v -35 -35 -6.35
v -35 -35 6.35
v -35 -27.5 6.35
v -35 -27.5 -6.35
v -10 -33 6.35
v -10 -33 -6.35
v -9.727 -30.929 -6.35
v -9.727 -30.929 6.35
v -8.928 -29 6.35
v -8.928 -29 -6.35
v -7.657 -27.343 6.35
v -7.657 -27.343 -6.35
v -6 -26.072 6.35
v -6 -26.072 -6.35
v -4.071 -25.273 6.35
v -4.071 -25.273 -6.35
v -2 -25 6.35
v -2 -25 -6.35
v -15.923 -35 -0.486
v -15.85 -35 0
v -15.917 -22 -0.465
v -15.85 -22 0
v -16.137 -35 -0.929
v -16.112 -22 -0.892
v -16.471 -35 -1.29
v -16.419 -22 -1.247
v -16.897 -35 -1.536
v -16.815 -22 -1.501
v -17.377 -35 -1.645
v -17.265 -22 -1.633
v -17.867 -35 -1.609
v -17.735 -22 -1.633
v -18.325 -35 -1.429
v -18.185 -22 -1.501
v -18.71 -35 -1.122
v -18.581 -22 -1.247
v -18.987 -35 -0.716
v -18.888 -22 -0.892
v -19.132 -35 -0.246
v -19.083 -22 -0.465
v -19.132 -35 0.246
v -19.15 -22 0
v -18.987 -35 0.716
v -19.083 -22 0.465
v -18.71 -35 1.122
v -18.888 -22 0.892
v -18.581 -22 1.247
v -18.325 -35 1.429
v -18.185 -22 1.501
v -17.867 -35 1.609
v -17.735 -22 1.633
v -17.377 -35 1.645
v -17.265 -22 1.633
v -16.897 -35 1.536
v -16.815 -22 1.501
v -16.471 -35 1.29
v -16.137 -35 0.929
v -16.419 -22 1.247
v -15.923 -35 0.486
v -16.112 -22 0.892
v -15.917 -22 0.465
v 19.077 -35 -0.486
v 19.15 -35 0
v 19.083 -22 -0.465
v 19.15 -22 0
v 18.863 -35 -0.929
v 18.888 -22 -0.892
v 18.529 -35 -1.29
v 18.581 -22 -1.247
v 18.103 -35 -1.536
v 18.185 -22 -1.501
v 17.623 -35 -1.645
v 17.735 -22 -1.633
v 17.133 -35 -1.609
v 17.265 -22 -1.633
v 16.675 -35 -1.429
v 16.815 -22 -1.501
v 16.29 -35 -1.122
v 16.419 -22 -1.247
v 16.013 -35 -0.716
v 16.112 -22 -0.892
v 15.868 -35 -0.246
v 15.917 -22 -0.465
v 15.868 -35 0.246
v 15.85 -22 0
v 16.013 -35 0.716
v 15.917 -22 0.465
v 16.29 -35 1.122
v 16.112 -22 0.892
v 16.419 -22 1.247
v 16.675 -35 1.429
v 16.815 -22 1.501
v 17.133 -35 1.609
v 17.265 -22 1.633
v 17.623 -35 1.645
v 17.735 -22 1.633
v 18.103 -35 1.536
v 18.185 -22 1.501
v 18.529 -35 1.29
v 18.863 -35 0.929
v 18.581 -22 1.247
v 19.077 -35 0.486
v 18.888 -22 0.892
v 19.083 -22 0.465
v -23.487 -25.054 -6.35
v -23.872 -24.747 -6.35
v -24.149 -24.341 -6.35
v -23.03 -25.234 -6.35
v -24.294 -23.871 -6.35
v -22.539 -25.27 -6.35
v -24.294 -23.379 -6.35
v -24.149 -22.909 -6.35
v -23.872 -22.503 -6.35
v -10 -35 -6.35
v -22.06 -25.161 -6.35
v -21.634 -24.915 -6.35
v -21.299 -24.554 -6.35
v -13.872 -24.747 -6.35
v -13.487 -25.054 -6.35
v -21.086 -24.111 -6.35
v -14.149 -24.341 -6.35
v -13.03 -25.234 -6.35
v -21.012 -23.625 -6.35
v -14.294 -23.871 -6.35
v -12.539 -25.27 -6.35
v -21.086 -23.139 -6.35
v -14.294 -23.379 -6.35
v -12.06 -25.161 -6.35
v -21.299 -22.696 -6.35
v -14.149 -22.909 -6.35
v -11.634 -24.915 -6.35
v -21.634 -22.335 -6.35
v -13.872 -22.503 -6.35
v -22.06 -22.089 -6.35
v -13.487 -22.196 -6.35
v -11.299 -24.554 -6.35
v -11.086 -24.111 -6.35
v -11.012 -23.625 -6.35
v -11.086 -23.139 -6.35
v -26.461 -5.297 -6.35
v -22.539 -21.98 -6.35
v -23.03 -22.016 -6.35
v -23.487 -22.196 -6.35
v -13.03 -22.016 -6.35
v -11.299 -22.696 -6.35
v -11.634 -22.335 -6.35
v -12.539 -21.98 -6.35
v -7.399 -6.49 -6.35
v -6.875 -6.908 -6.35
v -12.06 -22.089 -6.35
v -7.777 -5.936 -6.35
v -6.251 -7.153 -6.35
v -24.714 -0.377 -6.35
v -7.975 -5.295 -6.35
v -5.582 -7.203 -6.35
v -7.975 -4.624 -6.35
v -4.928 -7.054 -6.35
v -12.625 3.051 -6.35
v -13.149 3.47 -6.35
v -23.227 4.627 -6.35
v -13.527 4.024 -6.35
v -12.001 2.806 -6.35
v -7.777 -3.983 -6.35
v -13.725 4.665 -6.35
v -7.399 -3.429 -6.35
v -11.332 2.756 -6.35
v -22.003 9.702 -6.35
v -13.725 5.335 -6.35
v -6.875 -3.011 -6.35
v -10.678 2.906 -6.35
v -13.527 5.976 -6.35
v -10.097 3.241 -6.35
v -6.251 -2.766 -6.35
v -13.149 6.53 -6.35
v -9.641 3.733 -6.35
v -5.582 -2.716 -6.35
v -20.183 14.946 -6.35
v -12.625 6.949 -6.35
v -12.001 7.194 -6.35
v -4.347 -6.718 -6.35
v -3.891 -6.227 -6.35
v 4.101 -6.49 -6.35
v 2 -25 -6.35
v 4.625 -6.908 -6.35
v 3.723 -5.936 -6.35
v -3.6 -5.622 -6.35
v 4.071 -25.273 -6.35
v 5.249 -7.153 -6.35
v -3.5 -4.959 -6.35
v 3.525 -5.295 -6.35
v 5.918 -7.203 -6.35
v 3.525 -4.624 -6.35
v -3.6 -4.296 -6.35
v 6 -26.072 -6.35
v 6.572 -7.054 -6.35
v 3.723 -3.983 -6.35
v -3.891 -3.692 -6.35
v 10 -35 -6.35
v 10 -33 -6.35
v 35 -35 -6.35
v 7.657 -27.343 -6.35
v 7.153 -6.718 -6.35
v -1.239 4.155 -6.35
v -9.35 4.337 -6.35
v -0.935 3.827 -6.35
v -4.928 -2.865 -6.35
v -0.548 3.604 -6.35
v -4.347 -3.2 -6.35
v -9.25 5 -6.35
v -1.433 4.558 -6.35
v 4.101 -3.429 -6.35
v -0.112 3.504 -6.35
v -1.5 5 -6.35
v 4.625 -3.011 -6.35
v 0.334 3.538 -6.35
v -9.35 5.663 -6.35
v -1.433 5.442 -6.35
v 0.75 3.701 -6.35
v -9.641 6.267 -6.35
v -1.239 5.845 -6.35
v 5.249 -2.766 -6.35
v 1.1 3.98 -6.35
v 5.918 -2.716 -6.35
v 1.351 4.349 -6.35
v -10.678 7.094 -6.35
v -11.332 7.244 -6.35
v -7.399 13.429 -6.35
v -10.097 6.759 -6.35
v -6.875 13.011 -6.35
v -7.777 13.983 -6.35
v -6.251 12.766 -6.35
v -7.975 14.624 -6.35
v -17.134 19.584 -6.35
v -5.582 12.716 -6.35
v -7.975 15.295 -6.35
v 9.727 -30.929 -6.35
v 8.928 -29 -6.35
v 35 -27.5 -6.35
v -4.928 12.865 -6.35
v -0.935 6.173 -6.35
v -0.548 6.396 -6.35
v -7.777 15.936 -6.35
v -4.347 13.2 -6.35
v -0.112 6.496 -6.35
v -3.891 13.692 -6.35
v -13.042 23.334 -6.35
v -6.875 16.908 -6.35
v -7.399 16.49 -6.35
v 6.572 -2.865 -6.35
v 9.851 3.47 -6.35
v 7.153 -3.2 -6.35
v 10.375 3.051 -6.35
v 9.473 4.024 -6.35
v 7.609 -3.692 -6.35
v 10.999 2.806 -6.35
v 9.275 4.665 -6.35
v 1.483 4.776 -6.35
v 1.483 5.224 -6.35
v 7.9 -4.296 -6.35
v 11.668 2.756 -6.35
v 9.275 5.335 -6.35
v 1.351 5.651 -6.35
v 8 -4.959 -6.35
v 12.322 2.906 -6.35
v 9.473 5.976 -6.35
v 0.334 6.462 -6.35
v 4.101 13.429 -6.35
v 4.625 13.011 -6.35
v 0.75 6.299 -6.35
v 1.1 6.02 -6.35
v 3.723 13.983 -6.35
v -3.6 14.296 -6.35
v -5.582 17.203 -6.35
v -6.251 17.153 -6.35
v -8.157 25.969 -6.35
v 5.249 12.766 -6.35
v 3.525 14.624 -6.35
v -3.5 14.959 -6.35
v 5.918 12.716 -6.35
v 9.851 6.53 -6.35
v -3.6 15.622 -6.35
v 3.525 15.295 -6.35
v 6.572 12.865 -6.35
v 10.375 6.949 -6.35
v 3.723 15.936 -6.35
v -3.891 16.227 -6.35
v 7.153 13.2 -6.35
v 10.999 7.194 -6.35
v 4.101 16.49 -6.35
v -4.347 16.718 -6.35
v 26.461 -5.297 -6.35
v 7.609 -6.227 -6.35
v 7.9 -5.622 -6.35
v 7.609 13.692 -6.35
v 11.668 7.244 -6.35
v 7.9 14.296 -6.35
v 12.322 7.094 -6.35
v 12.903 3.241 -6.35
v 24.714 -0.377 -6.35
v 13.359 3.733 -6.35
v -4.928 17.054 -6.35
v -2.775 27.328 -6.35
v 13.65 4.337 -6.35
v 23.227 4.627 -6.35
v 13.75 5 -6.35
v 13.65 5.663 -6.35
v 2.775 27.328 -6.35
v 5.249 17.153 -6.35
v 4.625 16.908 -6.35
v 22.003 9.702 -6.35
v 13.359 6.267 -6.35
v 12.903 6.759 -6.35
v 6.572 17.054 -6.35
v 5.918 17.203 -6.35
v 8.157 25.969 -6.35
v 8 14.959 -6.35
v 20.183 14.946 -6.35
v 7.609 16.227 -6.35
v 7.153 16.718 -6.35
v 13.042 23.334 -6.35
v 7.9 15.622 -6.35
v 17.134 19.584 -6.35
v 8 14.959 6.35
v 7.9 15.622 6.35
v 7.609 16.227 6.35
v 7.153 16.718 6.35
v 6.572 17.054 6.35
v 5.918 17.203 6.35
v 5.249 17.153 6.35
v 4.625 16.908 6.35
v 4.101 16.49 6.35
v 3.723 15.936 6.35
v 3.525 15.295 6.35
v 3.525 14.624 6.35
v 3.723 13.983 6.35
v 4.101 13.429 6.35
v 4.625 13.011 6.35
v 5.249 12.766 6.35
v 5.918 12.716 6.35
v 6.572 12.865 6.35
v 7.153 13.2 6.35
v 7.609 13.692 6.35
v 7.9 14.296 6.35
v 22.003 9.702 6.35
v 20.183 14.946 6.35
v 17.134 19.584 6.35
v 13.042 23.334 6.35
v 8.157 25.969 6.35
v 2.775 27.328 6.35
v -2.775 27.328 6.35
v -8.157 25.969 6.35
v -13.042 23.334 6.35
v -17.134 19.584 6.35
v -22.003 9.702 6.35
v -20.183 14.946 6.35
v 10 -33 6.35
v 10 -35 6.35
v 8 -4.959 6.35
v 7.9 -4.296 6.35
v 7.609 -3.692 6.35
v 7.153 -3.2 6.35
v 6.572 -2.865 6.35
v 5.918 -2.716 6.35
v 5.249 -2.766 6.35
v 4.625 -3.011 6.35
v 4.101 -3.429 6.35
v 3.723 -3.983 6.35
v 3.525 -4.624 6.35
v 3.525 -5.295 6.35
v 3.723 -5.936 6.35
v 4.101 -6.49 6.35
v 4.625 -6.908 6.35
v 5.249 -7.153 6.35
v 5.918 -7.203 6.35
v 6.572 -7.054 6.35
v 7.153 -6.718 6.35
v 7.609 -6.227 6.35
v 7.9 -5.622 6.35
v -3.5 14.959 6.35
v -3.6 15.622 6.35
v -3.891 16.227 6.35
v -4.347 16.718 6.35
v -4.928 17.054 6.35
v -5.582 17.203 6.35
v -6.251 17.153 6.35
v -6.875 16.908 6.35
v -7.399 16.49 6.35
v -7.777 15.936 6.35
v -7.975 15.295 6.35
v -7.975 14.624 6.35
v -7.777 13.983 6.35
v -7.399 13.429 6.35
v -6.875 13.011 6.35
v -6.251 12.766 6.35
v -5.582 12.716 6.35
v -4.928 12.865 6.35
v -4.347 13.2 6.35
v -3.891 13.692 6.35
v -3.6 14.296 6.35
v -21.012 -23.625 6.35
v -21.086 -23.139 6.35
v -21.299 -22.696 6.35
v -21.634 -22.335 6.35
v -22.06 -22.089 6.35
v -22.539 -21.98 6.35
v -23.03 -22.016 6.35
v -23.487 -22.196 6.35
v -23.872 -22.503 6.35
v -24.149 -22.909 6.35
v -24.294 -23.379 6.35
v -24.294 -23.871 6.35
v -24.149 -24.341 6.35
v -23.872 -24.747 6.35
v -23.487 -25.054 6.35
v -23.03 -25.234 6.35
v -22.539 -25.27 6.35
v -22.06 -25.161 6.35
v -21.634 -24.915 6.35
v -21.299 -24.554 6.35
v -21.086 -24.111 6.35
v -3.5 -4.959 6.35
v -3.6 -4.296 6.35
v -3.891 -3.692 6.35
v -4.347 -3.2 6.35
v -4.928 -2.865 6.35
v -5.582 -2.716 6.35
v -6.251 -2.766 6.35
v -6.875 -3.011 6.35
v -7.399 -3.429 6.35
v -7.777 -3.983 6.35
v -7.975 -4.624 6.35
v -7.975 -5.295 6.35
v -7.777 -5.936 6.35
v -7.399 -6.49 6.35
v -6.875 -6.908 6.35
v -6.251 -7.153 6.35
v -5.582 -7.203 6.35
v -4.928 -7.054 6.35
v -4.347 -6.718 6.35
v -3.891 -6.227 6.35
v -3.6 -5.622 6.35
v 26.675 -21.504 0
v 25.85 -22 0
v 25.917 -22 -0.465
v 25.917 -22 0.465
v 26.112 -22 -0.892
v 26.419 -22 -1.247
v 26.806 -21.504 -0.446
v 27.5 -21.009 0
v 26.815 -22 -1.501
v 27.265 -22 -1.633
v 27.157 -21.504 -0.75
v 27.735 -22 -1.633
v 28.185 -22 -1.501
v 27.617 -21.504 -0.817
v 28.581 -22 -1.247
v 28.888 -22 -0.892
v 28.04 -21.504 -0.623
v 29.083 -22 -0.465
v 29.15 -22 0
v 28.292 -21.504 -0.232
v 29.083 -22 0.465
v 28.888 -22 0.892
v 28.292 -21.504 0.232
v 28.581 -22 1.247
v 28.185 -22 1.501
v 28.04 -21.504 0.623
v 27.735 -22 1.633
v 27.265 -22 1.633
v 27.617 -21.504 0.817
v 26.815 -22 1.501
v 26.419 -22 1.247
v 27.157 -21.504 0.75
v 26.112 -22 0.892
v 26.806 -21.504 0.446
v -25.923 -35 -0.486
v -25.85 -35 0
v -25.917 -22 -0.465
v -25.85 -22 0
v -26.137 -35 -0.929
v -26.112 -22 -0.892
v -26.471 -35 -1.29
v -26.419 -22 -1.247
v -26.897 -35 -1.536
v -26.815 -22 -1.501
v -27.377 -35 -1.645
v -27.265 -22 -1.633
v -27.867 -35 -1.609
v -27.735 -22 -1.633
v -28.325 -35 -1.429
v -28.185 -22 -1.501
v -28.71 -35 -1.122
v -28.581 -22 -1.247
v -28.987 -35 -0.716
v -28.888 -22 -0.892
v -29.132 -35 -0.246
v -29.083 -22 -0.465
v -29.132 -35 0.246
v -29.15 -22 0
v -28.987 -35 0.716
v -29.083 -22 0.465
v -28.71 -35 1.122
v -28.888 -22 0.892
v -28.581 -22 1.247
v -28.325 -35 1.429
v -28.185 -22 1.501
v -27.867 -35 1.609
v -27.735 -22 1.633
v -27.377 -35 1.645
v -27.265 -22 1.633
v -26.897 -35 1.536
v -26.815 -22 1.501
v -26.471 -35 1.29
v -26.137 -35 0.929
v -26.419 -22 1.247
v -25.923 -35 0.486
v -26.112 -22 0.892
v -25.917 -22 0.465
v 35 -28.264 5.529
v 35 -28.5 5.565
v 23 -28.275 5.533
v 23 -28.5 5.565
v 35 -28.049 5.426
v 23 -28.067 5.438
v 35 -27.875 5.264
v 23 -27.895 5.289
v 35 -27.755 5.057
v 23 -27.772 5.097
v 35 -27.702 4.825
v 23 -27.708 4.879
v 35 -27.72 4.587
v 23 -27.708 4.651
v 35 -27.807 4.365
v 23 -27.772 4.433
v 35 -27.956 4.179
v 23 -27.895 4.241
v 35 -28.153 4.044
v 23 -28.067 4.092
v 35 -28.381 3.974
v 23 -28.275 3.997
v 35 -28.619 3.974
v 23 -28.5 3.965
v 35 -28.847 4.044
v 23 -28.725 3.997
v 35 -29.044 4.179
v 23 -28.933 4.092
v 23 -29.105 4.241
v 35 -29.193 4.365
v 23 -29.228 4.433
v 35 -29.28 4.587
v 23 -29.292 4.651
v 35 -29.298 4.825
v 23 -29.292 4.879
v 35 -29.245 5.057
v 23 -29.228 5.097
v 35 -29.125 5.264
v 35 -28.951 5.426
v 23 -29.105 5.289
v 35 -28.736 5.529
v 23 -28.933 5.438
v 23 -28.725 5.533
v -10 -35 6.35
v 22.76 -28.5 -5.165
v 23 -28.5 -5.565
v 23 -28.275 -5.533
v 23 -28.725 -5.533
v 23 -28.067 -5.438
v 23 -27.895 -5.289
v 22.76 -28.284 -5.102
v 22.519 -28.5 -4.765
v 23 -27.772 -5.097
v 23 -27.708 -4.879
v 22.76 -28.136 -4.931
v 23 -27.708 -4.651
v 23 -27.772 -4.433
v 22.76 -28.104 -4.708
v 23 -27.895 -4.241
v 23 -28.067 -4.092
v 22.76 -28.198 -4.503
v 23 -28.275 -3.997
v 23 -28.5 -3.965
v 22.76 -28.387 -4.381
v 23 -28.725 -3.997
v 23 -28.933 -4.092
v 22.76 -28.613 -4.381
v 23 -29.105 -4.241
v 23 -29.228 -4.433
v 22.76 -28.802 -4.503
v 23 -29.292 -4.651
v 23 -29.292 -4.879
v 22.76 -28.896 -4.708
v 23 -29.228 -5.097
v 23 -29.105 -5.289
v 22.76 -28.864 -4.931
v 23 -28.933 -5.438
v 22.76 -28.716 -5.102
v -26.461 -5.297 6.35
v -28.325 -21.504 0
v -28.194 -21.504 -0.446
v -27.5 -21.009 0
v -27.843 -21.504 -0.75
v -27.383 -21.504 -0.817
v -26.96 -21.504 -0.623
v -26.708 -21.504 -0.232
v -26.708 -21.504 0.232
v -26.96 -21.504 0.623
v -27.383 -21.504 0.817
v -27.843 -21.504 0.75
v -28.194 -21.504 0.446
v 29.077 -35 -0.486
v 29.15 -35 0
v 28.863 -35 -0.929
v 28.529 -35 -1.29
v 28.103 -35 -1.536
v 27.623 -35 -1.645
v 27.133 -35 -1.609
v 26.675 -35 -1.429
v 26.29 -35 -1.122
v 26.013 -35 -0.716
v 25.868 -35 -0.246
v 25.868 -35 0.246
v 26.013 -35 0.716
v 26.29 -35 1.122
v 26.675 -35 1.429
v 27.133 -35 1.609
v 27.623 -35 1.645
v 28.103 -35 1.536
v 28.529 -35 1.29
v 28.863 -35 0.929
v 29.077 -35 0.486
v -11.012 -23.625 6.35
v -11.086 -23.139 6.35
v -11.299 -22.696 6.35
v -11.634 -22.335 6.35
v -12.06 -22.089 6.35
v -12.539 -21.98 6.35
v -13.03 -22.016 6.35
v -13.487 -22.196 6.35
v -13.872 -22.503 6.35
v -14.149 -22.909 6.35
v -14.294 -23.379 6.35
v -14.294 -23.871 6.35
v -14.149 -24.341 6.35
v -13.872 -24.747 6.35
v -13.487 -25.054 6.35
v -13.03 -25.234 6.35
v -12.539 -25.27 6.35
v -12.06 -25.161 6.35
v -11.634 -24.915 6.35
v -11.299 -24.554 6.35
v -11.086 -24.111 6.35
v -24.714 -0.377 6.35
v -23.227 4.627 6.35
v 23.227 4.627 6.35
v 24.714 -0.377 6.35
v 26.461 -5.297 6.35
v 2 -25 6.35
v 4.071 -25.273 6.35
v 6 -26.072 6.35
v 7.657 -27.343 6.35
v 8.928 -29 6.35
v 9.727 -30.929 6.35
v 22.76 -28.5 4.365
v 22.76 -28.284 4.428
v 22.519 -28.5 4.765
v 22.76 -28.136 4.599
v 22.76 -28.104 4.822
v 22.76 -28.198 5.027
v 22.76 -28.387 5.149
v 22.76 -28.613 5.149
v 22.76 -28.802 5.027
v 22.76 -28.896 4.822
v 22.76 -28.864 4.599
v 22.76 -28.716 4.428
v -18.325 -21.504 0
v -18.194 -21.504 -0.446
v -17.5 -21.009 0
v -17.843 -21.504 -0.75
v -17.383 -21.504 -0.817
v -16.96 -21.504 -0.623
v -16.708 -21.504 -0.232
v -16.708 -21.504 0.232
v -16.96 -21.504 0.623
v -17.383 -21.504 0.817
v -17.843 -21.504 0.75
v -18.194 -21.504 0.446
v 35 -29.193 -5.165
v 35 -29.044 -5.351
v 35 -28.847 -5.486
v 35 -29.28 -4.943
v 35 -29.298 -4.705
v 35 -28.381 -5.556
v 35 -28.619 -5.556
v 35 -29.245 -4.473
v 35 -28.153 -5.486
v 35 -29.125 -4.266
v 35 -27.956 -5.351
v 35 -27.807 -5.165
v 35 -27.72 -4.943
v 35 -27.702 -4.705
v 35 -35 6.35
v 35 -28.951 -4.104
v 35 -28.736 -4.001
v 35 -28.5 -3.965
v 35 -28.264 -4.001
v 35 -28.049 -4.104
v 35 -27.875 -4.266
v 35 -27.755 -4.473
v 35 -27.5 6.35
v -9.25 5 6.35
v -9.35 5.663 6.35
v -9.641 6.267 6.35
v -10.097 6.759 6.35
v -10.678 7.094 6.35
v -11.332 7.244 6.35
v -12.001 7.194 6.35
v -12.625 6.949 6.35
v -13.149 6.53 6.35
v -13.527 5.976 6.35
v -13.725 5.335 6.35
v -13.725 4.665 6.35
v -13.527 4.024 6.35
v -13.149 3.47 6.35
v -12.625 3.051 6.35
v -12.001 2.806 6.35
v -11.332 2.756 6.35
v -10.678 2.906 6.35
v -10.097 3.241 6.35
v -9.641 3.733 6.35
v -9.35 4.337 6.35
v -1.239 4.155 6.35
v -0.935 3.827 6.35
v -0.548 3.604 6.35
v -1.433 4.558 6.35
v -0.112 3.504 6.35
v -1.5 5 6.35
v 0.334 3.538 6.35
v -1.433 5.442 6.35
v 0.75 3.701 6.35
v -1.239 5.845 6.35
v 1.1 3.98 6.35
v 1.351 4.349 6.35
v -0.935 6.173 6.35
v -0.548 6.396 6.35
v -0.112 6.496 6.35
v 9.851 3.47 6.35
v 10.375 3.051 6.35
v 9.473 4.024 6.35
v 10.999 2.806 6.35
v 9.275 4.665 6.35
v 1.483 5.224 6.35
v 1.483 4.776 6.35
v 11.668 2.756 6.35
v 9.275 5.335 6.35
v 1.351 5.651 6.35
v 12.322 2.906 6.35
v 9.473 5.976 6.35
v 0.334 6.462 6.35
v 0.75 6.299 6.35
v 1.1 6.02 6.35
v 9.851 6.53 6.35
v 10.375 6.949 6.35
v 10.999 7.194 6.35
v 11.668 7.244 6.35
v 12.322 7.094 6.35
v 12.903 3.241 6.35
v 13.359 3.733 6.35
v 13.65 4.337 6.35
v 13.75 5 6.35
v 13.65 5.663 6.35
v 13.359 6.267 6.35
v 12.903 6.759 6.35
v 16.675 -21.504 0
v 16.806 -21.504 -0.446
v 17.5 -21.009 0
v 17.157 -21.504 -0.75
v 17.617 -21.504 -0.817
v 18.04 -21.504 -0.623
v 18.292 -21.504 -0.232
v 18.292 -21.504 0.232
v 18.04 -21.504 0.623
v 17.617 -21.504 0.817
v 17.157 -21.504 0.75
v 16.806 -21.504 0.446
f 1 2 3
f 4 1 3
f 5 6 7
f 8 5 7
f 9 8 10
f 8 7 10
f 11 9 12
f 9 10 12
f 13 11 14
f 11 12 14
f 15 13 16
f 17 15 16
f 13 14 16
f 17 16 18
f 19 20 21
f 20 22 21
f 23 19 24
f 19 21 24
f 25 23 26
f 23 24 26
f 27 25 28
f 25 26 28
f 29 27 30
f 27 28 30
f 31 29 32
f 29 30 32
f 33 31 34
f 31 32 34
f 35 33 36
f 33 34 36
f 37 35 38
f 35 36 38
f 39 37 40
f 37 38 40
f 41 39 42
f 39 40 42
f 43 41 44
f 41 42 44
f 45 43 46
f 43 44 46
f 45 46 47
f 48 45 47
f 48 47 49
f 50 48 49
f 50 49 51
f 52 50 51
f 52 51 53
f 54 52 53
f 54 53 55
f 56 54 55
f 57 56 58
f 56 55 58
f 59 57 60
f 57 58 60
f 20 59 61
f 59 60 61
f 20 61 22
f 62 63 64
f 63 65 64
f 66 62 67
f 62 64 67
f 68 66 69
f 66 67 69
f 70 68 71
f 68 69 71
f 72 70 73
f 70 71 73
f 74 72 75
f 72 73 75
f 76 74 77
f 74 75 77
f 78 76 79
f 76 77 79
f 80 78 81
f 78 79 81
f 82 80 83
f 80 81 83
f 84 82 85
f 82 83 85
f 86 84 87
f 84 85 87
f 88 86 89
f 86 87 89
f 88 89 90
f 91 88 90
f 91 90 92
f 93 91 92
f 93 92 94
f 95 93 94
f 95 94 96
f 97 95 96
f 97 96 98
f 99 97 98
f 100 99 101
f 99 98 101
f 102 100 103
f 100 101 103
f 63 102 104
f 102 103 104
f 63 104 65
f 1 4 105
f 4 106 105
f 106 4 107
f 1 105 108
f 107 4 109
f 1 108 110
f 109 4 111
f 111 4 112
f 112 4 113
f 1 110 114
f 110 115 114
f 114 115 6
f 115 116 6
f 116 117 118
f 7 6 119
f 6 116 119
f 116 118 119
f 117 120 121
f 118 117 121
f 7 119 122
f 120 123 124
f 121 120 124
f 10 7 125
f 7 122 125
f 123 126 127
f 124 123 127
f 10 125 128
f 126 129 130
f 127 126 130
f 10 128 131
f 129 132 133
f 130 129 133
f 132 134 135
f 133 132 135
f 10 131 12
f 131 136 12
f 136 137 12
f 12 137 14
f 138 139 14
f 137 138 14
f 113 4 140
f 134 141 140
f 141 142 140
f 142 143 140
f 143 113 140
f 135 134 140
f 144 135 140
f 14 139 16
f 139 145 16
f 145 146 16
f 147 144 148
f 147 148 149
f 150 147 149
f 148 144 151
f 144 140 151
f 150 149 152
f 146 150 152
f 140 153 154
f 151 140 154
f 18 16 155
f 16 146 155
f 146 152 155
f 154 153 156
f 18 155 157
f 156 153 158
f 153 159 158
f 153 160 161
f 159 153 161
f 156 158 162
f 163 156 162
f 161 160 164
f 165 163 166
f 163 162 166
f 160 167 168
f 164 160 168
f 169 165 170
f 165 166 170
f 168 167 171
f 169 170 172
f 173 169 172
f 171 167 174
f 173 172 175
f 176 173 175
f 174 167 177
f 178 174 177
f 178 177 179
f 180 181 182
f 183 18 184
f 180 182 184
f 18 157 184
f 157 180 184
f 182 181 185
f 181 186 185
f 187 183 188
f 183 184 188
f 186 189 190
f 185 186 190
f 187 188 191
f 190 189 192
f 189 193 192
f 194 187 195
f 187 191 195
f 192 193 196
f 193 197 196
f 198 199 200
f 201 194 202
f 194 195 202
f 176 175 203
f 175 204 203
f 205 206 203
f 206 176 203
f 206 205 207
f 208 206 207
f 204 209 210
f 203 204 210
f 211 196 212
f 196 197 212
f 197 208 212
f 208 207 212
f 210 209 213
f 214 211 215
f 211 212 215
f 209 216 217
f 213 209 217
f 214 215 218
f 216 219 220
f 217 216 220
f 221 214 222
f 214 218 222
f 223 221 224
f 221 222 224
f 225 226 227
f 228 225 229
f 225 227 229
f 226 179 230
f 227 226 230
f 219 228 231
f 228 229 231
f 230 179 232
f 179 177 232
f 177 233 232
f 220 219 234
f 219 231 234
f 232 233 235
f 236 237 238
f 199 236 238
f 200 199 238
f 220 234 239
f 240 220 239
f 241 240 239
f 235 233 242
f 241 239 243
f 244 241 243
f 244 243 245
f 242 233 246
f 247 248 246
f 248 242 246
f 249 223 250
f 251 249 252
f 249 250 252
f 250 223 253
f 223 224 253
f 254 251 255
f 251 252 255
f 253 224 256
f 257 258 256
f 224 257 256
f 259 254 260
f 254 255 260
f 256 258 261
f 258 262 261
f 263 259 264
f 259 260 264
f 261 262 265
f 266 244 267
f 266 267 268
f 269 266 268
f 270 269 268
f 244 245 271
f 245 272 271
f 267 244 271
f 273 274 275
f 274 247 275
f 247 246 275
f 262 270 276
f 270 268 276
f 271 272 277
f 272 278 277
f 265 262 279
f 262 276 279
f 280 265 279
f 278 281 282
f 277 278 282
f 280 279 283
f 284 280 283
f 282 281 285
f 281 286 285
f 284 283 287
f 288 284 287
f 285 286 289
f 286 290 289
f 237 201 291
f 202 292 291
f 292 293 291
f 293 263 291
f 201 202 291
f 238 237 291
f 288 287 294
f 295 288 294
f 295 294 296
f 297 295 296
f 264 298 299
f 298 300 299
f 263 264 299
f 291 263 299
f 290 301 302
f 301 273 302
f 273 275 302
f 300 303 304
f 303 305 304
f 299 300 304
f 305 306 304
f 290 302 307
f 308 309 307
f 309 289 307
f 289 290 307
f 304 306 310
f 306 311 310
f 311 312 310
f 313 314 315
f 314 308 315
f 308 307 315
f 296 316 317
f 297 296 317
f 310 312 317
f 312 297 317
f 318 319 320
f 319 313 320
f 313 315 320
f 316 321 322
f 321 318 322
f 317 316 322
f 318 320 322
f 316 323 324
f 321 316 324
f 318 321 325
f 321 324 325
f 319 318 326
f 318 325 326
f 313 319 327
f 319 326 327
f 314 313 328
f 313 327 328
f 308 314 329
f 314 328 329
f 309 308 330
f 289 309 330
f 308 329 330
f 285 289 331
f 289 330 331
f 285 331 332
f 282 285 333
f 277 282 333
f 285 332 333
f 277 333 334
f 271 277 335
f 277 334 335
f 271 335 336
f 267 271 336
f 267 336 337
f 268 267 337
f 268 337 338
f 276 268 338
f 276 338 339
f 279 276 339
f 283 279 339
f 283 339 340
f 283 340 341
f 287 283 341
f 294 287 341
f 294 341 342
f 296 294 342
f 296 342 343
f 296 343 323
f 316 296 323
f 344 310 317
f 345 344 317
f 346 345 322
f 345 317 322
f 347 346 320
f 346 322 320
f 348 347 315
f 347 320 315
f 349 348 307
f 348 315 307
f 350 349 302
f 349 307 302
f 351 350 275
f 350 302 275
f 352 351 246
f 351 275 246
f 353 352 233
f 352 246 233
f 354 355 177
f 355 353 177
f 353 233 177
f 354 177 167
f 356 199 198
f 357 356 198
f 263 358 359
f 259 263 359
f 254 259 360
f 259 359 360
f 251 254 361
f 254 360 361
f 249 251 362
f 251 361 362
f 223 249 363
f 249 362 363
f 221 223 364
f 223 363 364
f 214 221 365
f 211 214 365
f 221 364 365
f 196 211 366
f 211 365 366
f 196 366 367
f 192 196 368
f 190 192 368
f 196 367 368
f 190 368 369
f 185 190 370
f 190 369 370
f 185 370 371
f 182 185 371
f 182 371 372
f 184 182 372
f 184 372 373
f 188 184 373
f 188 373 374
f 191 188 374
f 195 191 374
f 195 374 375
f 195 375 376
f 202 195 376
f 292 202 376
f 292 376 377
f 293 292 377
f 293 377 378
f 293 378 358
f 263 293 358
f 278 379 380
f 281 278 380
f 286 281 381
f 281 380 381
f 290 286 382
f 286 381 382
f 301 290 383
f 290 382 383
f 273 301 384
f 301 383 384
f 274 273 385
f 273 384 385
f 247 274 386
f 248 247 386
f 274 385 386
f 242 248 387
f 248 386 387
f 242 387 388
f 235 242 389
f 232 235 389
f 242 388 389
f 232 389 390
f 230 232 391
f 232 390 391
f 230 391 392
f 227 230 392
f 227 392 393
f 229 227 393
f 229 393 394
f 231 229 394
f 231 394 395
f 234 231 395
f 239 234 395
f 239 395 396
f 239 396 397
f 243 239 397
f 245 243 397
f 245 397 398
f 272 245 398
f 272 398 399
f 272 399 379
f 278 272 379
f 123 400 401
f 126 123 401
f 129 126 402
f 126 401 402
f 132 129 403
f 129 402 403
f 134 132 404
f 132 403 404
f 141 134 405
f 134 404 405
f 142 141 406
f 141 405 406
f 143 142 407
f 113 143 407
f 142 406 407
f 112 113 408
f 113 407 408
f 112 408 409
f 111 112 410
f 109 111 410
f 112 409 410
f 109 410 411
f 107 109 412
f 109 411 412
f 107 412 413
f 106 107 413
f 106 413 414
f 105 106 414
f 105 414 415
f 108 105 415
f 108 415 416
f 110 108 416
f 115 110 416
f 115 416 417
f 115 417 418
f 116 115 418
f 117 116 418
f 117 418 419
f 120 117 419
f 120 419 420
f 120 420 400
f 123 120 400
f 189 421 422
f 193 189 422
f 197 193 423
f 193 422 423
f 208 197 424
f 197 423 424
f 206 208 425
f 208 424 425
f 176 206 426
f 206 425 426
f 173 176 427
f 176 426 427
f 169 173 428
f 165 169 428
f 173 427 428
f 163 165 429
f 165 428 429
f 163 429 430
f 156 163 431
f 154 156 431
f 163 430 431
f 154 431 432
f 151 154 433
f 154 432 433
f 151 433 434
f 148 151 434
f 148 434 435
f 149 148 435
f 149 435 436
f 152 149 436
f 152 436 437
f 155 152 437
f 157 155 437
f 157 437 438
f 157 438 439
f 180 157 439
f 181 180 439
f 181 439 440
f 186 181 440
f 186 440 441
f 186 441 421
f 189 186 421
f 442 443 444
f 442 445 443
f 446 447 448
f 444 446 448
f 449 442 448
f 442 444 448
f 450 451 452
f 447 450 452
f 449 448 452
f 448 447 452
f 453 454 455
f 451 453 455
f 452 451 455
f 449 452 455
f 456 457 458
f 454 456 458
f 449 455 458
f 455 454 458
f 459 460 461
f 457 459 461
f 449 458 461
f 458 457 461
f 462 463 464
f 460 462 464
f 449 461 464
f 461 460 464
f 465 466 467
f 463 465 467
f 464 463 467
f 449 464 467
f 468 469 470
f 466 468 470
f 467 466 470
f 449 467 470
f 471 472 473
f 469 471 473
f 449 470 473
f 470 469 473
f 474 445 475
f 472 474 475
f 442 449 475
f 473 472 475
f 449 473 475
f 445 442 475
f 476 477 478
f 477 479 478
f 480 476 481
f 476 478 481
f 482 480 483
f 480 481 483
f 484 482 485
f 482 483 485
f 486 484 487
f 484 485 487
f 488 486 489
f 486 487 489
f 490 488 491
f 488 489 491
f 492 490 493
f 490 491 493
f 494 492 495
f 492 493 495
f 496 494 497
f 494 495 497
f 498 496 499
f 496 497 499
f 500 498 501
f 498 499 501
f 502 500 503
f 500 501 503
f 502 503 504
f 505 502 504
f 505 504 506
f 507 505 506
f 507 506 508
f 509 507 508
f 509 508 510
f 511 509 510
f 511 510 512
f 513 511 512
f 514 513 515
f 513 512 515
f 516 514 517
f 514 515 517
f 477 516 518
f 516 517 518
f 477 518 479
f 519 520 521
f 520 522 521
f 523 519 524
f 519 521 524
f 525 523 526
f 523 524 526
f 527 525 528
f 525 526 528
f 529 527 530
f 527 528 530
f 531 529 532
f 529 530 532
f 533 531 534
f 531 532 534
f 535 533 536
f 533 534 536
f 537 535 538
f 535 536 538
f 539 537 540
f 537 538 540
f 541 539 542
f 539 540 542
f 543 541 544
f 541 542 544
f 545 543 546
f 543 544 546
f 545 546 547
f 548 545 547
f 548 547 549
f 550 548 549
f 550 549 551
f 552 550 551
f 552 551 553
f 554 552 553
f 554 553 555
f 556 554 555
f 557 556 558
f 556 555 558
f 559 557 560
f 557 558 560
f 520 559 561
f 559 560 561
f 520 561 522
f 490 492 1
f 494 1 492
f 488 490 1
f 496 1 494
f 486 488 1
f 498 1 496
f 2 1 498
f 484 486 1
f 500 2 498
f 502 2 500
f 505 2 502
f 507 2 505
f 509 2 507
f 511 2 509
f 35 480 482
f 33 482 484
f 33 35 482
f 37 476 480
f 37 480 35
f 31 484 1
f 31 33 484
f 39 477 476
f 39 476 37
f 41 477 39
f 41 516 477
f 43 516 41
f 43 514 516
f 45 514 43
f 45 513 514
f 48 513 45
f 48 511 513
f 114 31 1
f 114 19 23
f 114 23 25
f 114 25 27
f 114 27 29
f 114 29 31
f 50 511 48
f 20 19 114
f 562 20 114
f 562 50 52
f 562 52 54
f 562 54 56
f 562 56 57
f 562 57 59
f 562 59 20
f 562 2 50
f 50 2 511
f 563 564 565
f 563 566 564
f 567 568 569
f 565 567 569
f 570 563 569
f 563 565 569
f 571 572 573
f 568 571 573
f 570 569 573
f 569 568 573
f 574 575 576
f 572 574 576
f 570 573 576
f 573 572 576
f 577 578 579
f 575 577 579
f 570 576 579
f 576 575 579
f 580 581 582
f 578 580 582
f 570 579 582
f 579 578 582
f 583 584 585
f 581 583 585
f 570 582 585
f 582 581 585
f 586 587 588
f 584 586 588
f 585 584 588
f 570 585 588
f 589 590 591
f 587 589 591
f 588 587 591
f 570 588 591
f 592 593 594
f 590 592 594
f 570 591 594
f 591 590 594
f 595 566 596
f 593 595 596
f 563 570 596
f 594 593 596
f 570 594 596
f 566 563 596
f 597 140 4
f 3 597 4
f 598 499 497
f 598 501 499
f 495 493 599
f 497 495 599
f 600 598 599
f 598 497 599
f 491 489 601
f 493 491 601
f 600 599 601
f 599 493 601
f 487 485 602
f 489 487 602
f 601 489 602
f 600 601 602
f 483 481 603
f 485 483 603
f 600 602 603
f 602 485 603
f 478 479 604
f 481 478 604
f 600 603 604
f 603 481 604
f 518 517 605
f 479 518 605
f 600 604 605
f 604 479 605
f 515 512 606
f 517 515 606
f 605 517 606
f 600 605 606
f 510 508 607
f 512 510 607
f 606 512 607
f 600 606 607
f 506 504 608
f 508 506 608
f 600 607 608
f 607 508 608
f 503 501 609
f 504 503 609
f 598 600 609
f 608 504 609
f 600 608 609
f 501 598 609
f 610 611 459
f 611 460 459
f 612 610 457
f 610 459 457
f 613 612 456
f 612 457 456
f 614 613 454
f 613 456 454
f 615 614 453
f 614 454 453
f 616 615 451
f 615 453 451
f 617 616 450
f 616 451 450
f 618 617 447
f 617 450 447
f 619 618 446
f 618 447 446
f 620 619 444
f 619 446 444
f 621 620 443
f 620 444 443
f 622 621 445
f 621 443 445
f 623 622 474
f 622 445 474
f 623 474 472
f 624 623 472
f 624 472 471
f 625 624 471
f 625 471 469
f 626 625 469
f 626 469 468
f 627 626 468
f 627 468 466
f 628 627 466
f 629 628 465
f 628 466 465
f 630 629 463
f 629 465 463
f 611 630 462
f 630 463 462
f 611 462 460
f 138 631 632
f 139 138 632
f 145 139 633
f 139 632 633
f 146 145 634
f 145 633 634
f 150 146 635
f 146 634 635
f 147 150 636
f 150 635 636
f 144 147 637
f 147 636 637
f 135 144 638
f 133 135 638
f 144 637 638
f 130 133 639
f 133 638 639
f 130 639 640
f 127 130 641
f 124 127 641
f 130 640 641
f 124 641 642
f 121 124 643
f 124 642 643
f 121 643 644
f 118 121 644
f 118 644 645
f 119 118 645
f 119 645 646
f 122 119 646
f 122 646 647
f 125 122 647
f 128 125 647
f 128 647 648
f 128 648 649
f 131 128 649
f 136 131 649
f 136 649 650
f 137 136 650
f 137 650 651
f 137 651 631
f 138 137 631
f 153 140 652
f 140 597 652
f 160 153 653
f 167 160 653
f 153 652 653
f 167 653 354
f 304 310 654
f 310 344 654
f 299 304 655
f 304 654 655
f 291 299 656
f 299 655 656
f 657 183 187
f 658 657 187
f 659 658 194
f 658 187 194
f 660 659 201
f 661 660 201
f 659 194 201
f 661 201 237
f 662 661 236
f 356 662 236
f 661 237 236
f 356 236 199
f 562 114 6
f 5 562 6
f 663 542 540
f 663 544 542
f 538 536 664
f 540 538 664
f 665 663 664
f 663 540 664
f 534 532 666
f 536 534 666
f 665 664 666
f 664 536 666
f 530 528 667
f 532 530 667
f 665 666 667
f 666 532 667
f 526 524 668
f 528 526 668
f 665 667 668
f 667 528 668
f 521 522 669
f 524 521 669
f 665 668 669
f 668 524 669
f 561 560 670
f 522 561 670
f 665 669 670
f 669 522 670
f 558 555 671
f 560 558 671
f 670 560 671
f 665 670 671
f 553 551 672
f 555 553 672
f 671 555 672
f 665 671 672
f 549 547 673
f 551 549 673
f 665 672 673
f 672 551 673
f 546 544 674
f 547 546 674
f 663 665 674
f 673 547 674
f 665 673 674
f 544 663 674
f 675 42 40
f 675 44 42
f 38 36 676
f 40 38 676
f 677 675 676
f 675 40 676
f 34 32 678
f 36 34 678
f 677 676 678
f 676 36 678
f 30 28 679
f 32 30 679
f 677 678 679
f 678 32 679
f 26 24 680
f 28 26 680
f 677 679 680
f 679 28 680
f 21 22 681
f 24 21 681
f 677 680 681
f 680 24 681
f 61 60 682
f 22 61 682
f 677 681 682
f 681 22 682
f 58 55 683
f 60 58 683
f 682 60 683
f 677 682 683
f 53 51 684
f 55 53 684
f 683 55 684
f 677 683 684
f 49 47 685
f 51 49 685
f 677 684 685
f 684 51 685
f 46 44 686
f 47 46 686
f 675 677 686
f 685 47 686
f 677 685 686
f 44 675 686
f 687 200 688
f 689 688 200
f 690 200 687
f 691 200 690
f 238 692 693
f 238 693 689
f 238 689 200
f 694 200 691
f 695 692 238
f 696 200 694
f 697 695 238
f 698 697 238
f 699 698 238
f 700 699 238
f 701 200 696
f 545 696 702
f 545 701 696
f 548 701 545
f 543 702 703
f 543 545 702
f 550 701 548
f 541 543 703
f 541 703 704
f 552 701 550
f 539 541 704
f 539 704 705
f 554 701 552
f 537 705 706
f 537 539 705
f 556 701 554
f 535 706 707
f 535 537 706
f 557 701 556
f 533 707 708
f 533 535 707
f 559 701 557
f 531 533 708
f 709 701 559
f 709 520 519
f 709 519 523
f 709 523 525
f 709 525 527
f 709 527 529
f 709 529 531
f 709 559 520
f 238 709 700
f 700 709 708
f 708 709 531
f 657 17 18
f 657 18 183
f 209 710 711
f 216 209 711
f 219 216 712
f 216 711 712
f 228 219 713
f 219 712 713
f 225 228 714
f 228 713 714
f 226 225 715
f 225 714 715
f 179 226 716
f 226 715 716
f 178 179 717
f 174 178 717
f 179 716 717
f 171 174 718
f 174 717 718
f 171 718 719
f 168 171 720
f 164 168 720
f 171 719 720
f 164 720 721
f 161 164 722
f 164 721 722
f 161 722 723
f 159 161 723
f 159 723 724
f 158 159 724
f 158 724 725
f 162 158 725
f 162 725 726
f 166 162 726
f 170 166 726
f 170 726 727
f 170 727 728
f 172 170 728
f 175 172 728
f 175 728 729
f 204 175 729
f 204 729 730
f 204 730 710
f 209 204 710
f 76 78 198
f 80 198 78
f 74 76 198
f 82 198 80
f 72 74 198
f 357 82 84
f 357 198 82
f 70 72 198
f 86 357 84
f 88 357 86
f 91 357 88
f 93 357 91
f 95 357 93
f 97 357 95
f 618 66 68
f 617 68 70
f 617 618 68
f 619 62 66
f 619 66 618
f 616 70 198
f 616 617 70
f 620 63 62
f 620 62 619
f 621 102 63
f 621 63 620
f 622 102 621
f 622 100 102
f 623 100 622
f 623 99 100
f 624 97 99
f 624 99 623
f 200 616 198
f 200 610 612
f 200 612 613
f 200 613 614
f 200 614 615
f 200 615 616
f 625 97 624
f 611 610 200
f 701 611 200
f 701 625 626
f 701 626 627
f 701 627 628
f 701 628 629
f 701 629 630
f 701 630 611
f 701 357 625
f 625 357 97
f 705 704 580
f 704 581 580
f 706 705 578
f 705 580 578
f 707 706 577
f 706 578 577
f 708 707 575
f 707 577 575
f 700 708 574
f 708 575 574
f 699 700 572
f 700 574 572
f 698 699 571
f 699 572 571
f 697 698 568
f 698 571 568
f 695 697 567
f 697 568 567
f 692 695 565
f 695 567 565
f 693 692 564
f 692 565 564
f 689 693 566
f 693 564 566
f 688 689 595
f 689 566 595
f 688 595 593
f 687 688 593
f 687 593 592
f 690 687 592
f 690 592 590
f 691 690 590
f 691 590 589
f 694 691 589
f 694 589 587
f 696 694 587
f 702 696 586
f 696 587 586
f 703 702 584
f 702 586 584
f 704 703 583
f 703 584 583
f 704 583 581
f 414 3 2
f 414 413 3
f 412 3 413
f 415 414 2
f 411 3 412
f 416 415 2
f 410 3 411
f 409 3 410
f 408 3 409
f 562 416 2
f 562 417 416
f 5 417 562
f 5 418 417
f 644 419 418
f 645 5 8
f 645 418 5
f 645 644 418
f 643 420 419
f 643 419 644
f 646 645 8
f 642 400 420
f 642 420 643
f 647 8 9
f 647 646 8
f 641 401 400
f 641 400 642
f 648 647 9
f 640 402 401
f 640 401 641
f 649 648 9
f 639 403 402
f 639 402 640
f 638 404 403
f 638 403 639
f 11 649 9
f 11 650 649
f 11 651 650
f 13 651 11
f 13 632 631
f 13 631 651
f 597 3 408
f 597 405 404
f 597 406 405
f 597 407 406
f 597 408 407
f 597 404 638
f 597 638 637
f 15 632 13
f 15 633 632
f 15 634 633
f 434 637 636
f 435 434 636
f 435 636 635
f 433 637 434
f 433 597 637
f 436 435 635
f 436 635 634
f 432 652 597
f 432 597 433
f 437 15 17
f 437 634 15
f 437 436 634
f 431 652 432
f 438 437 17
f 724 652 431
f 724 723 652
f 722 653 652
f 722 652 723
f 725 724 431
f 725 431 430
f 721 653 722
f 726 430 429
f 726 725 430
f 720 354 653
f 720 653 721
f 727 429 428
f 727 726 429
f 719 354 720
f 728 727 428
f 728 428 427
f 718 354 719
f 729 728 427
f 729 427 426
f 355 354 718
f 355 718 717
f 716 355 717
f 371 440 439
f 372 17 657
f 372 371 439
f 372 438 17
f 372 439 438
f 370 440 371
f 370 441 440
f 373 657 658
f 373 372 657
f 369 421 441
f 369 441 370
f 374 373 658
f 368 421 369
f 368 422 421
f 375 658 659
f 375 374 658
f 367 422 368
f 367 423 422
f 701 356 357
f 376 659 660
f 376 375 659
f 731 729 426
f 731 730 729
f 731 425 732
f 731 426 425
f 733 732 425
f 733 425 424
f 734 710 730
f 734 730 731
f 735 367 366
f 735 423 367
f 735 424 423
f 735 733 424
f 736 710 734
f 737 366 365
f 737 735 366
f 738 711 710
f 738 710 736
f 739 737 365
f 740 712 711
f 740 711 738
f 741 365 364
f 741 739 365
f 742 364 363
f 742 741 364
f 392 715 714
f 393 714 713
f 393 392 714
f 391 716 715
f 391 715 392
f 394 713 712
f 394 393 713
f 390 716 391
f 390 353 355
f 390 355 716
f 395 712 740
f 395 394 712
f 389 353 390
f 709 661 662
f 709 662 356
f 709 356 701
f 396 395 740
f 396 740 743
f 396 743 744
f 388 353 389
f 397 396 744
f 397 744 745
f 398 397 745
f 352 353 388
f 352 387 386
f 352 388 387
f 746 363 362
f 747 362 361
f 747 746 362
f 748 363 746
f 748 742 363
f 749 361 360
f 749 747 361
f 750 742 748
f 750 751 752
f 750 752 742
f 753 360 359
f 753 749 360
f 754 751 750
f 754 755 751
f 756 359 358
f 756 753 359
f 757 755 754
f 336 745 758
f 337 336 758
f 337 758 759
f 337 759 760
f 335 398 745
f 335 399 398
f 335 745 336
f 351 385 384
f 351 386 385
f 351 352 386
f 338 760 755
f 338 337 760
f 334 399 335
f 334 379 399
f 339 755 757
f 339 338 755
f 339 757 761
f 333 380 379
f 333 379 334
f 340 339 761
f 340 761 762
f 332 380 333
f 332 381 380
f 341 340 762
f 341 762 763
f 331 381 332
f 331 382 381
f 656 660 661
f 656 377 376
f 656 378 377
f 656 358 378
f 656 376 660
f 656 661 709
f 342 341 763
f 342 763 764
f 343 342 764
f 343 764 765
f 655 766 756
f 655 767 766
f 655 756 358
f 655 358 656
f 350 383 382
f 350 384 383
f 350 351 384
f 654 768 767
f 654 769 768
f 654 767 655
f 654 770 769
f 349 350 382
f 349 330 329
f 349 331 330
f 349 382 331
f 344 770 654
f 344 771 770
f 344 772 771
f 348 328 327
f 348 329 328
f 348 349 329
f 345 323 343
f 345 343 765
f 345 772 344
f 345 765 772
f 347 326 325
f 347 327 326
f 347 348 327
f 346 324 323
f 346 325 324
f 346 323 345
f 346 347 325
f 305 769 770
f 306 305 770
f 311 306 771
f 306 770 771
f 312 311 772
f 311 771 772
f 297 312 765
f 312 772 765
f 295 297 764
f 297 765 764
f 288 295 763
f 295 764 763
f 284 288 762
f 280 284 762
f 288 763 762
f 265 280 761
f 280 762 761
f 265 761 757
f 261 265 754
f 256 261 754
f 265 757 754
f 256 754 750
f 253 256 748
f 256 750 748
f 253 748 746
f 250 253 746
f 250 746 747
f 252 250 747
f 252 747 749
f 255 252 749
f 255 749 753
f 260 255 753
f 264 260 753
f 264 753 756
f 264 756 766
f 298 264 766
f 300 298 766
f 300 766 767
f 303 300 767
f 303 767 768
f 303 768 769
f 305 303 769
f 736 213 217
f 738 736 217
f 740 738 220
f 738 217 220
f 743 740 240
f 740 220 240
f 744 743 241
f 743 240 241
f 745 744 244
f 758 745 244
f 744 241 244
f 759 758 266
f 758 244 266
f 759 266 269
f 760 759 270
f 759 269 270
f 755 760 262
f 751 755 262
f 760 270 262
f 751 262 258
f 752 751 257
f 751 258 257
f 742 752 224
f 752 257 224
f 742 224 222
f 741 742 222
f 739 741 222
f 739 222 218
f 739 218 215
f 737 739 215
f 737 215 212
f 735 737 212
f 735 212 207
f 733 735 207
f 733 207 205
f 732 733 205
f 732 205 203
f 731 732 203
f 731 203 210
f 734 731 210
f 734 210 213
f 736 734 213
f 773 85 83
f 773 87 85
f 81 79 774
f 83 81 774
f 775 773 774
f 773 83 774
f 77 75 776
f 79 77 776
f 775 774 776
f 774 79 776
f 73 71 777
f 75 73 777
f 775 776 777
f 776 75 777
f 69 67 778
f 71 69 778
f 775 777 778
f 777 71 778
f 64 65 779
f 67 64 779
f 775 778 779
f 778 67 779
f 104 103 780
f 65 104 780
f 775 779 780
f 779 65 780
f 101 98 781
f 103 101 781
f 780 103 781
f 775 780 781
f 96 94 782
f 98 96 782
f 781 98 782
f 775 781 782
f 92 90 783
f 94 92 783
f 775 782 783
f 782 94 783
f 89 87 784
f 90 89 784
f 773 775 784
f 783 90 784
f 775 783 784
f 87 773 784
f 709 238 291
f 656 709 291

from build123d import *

# Parameters (mm, degrees)
SKETCH2_W                 = 70
SKETCH2_H                 = 70
BOSS_EXTRUDE1_DEPTH       = 6.35
CHAMFER1_SIZE             = 10
SKETCH3_R                 = 1.5
CUT_EXTRUDE1_DEPTH        = 13.7
M4_CLEARANCE_HOLE1_D      = 4.5
CUT_EXTRUDE2_DEPTH        = 13.7
FILLET1_R                 = 100
CUT_EXTRUDE3_DEPTH        = 13.7
M4X0_7_TAPPED_HOLE1_D     = 3.3
M4X0_7_TAPPED_HOLE1_DEPTH = 13
M4X0_7_TAPPED_HOLE1_TIP   = 0.991420021
M4X0_7_TAPPED_HOLE2_D     = 3.3
M2X0_4_TAPPED_HOLE1_D     = 1.6
M2X0_4_TAPPED_HOLE1_DEPTH = 12
M2X0_4_TAPPED_HOLE1_TIP   = 0.480688495


with BuildPart() as part:
    # Sketch2 → Boss-Extrude1 (new body, symmetric)
    with BuildSketch(Plane.XY):
        Rectangle(SKETCH2_W, SKETCH2_H)
    extrude(amount=BOSS_EXTRUDE1_DEPTH, both=True)

    # Chamfer1
    chamfer1_edges = [part.edges().sort_by_distance(p)[0] for p in [
        (-35, 35, 0),
        (35, 35, 0),
    ]]
    chamfer(chamfer1_edges, length=CHAMFER1_SIZE)

    # Sketch3 → Cut-Extrude1 (cut, through all)
    with BuildSketch(Plane(origin=(0, 0, -6.35), x_dir=(-1, 0, 0), z_dir=(0, 0, -1))):
        with Locations((0, 5)):
            Circle(SKETCH3_R)
    extrude(amount=-CUT_EXTRUDE1_DEPTH, mode=Mode.SUBTRACT)

    # M4 Clearance Hole1 (through all)
    with Locations(Plane(origin=(0, 0, -6.35), x_dir=(-1, 0, 0), z_dir=(0, 0, -1))):
        with Locations((5.75, 14.959292144), (-5.75, 14.959292144), (-11.5, 5), (-5.75, -4.959292144), (5.75, -4.959292144), (11.5, 5)):
            Hole(M4_CLEARANCE_HOLE1_D / 2)

    # Sketch6 → Cut-Extrude2 (cut, through all)
    with BuildSketch(Plane(origin=(0, 0, -6.35), x_dir=(-1, 0, 0), z_dir=(0, 0, -1))):
        with BuildLine():
            Line((-35, -27.5), (-22.5, 5))
            ThreePointArc((-22.5, 5), (0, 27.5), (22.5, 5))
            Line((22.5, 5), (35, -27.5))
            Line((35, -27.5), (35, 25))
            Line((35, 25), (25, 35))
            Line((25, 35), (-25, 35))
            Line((-25, 35), (-35, 25))
            Line((-35, 25), (-35, -27.5))
        make_face()
    extrude(amount=-CUT_EXTRUDE2_DEPTH, mode=Mode.SUBTRACT)

    # Fillet1
    fillet1_edges = [part.edges().sort_by_distance(p)[0] for p in [
        (-22.5, 5, 0),
        (22.5, 5, 0),
    ]]
    fillet(fillet1_edges, radius=FILLET1_R)

    # Sketch7 → Cut-Extrude3 (cut, through all)
    with BuildSketch(Plane(origin=(0, 0, -6.35), x_dir=(-1, 0, 0), z_dir=(0, 0, -1))):
        with BuildLine():
            Line((-10, -35), (10, -35))
            Line((10, -35), (10, -33))
            ThreePointArc((10, -33), (7.656854249, -27.343145751), (2, -25))
            Line((2, -25), (-2, -25))
            ThreePointArc((-2, -25), (-7.656854249, -27.343145751), (-10, -33))
            Line((-10, -33), (-10, -35))
        make_face()
    extrude(amount=-CUT_EXTRUDE3_DEPTH, mode=Mode.SUBTRACT)

    # M4x0.7 Tapped Hole1
    with Locations(Plane(origin=(0, -35, 0), x_dir=(-1, 0, 0), z_dir=(0, -1, 0))):
        with Locations((-27.5, 0), (-17.5, 0), (17.5, 0), (27.5, 0)):
            Hole(M4X0_7_TAPPED_HOLE1_D / 2, depth=M4X0_7_TAPPED_HOLE1_DEPTH)
            with Locations((0, 0, -(M4X0_7_TAPPED_HOLE1_DEPTH + M4X0_7_TAPPED_HOLE1_TIP / 2))):  # 118° drill point
                Cone(0, M4X0_7_TAPPED_HOLE1_D / 2, M4X0_7_TAPPED_HOLE1_TIP, mode=Mode.SUBTRACT)

    # M4x0.7 Tapped Hole2 (through all)
    with Locations(Plane(origin=(0, 0, -6.35), x_dir=(-1, 0, 0), z_dir=(0, 0, -1))):
        with Locations((12.662387957, -23.625), (22.662387957, -23.625)):
            Hole(M4X0_7_TAPPED_HOLE2_D / 2)

    # M2x0.4 Tapped Hole1
    with Locations(Plane(origin=(35, 0, 0), x_dir=(0, 0, -1), z_dir=(1, 0, 0))):
        with Locations((-4.765, -28.5), (4.765, -28.5)):
            Hole(M2X0_4_TAPPED_HOLE1_D / 2, depth=M2X0_4_TAPPED_HOLE1_DEPTH)
            with Locations((0, 0, -(M2X0_4_TAPPED_HOLE1_DEPTH + M2X0_4_TAPPED_HOLE1_TIP / 2))):  # 118° drill point
                Cone(0, M2X0_4_TAPPED_HOLE1_D / 2, M2X0_4_TAPPED_HOLE1_TIP, mode=Mode.SUBTRACT)


solid = part.part
